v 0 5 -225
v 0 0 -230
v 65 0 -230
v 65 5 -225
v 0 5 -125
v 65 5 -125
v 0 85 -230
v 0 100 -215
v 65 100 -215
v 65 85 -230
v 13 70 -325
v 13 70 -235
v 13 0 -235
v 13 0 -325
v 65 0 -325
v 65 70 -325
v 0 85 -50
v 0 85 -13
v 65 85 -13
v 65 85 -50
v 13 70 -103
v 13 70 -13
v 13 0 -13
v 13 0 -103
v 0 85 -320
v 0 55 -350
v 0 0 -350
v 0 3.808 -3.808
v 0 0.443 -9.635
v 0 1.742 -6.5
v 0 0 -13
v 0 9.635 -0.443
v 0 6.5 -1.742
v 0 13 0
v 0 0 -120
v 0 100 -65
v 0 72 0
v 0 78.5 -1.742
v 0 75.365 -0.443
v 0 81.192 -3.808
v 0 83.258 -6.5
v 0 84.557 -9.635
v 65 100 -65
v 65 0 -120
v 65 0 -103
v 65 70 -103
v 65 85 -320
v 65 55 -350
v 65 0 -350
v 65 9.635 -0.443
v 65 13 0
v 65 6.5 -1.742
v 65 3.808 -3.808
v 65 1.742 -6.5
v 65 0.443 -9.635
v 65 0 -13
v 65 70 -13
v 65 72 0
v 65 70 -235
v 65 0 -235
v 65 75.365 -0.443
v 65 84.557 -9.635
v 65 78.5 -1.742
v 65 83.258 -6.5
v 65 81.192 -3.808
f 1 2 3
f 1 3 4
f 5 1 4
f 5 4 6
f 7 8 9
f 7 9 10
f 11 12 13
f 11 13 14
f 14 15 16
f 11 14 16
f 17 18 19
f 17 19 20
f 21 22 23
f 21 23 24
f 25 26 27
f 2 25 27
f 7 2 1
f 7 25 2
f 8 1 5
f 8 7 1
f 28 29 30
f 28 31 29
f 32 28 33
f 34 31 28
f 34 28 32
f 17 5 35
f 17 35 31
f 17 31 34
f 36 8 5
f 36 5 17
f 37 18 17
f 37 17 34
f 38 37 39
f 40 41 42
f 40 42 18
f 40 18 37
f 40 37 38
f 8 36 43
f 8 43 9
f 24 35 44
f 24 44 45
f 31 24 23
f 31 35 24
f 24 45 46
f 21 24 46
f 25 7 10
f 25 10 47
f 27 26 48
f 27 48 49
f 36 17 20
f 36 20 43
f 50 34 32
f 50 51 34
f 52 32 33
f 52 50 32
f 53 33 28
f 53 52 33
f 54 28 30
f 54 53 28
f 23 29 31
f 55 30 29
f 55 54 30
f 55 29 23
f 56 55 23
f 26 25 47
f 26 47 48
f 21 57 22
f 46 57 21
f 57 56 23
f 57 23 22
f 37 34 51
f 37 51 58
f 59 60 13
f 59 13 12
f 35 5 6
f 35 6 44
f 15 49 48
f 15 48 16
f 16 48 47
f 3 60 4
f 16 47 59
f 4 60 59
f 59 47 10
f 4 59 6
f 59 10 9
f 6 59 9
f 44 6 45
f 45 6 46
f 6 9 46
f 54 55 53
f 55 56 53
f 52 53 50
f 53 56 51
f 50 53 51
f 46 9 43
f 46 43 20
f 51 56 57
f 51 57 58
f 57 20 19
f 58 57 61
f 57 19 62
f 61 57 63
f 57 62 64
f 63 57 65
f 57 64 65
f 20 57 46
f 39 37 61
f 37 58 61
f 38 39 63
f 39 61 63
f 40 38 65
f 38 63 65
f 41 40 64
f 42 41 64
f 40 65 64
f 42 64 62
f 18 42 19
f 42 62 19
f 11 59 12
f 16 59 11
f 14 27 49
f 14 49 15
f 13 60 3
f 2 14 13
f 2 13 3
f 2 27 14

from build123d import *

# Parameters (mm, degrees)
BOSS_EXTRUDE1_DEPTH = 65
FILLET1_R           = 13
SKETCH3_W           = 90
SKETCH3_H           = 70
CUT_EXTRUDE1_DEPTH  = 52


with BuildPart() as part:
    # Sketch2 → Boss-Extrude1 (new body)
    with BuildSketch(Plane(origin=(0, 0, 0), x_dir=(0, 0, -1), z_dir=(1, 0, 0))):
        Polygon((0, 0), (0, 85), (50, 85), (65, 100), (215, 100), (230, 85), (320, 85), (350, 55), (350, 0), (230, 0), (225, 5), (125, 5), (120, 0), align=None)
    extrude(amount=BOSS_EXTRUDE1_DEPTH)

    # Fillet1
    fillet1_edges = [part.edges().sort_by_distance(p)[0] for p in [
        (32.5, 0, 0),
        (32.5, 85, 0),
    ]]
    fillet(fillet1_edges, radius=FILLET1_R)

    # Sketch3 → Cut-Extrude1 (cut)
    with BuildSketch(Plane(origin=(65, 0, 0), x_dir=(0, 0, -1), z_dir=(1, 0, 0))):
        with Locations((58, 35)):
            Rectangle(SKETCH3_W, SKETCH3_H)
        with Locations((280, 35)):
            Rectangle(SKETCH3_W, SKETCH3_H)
    extrude(amount=-CUT_EXTRUDE1_DEPTH, mode=Mode.SUBTRACT)


solid = part.part
